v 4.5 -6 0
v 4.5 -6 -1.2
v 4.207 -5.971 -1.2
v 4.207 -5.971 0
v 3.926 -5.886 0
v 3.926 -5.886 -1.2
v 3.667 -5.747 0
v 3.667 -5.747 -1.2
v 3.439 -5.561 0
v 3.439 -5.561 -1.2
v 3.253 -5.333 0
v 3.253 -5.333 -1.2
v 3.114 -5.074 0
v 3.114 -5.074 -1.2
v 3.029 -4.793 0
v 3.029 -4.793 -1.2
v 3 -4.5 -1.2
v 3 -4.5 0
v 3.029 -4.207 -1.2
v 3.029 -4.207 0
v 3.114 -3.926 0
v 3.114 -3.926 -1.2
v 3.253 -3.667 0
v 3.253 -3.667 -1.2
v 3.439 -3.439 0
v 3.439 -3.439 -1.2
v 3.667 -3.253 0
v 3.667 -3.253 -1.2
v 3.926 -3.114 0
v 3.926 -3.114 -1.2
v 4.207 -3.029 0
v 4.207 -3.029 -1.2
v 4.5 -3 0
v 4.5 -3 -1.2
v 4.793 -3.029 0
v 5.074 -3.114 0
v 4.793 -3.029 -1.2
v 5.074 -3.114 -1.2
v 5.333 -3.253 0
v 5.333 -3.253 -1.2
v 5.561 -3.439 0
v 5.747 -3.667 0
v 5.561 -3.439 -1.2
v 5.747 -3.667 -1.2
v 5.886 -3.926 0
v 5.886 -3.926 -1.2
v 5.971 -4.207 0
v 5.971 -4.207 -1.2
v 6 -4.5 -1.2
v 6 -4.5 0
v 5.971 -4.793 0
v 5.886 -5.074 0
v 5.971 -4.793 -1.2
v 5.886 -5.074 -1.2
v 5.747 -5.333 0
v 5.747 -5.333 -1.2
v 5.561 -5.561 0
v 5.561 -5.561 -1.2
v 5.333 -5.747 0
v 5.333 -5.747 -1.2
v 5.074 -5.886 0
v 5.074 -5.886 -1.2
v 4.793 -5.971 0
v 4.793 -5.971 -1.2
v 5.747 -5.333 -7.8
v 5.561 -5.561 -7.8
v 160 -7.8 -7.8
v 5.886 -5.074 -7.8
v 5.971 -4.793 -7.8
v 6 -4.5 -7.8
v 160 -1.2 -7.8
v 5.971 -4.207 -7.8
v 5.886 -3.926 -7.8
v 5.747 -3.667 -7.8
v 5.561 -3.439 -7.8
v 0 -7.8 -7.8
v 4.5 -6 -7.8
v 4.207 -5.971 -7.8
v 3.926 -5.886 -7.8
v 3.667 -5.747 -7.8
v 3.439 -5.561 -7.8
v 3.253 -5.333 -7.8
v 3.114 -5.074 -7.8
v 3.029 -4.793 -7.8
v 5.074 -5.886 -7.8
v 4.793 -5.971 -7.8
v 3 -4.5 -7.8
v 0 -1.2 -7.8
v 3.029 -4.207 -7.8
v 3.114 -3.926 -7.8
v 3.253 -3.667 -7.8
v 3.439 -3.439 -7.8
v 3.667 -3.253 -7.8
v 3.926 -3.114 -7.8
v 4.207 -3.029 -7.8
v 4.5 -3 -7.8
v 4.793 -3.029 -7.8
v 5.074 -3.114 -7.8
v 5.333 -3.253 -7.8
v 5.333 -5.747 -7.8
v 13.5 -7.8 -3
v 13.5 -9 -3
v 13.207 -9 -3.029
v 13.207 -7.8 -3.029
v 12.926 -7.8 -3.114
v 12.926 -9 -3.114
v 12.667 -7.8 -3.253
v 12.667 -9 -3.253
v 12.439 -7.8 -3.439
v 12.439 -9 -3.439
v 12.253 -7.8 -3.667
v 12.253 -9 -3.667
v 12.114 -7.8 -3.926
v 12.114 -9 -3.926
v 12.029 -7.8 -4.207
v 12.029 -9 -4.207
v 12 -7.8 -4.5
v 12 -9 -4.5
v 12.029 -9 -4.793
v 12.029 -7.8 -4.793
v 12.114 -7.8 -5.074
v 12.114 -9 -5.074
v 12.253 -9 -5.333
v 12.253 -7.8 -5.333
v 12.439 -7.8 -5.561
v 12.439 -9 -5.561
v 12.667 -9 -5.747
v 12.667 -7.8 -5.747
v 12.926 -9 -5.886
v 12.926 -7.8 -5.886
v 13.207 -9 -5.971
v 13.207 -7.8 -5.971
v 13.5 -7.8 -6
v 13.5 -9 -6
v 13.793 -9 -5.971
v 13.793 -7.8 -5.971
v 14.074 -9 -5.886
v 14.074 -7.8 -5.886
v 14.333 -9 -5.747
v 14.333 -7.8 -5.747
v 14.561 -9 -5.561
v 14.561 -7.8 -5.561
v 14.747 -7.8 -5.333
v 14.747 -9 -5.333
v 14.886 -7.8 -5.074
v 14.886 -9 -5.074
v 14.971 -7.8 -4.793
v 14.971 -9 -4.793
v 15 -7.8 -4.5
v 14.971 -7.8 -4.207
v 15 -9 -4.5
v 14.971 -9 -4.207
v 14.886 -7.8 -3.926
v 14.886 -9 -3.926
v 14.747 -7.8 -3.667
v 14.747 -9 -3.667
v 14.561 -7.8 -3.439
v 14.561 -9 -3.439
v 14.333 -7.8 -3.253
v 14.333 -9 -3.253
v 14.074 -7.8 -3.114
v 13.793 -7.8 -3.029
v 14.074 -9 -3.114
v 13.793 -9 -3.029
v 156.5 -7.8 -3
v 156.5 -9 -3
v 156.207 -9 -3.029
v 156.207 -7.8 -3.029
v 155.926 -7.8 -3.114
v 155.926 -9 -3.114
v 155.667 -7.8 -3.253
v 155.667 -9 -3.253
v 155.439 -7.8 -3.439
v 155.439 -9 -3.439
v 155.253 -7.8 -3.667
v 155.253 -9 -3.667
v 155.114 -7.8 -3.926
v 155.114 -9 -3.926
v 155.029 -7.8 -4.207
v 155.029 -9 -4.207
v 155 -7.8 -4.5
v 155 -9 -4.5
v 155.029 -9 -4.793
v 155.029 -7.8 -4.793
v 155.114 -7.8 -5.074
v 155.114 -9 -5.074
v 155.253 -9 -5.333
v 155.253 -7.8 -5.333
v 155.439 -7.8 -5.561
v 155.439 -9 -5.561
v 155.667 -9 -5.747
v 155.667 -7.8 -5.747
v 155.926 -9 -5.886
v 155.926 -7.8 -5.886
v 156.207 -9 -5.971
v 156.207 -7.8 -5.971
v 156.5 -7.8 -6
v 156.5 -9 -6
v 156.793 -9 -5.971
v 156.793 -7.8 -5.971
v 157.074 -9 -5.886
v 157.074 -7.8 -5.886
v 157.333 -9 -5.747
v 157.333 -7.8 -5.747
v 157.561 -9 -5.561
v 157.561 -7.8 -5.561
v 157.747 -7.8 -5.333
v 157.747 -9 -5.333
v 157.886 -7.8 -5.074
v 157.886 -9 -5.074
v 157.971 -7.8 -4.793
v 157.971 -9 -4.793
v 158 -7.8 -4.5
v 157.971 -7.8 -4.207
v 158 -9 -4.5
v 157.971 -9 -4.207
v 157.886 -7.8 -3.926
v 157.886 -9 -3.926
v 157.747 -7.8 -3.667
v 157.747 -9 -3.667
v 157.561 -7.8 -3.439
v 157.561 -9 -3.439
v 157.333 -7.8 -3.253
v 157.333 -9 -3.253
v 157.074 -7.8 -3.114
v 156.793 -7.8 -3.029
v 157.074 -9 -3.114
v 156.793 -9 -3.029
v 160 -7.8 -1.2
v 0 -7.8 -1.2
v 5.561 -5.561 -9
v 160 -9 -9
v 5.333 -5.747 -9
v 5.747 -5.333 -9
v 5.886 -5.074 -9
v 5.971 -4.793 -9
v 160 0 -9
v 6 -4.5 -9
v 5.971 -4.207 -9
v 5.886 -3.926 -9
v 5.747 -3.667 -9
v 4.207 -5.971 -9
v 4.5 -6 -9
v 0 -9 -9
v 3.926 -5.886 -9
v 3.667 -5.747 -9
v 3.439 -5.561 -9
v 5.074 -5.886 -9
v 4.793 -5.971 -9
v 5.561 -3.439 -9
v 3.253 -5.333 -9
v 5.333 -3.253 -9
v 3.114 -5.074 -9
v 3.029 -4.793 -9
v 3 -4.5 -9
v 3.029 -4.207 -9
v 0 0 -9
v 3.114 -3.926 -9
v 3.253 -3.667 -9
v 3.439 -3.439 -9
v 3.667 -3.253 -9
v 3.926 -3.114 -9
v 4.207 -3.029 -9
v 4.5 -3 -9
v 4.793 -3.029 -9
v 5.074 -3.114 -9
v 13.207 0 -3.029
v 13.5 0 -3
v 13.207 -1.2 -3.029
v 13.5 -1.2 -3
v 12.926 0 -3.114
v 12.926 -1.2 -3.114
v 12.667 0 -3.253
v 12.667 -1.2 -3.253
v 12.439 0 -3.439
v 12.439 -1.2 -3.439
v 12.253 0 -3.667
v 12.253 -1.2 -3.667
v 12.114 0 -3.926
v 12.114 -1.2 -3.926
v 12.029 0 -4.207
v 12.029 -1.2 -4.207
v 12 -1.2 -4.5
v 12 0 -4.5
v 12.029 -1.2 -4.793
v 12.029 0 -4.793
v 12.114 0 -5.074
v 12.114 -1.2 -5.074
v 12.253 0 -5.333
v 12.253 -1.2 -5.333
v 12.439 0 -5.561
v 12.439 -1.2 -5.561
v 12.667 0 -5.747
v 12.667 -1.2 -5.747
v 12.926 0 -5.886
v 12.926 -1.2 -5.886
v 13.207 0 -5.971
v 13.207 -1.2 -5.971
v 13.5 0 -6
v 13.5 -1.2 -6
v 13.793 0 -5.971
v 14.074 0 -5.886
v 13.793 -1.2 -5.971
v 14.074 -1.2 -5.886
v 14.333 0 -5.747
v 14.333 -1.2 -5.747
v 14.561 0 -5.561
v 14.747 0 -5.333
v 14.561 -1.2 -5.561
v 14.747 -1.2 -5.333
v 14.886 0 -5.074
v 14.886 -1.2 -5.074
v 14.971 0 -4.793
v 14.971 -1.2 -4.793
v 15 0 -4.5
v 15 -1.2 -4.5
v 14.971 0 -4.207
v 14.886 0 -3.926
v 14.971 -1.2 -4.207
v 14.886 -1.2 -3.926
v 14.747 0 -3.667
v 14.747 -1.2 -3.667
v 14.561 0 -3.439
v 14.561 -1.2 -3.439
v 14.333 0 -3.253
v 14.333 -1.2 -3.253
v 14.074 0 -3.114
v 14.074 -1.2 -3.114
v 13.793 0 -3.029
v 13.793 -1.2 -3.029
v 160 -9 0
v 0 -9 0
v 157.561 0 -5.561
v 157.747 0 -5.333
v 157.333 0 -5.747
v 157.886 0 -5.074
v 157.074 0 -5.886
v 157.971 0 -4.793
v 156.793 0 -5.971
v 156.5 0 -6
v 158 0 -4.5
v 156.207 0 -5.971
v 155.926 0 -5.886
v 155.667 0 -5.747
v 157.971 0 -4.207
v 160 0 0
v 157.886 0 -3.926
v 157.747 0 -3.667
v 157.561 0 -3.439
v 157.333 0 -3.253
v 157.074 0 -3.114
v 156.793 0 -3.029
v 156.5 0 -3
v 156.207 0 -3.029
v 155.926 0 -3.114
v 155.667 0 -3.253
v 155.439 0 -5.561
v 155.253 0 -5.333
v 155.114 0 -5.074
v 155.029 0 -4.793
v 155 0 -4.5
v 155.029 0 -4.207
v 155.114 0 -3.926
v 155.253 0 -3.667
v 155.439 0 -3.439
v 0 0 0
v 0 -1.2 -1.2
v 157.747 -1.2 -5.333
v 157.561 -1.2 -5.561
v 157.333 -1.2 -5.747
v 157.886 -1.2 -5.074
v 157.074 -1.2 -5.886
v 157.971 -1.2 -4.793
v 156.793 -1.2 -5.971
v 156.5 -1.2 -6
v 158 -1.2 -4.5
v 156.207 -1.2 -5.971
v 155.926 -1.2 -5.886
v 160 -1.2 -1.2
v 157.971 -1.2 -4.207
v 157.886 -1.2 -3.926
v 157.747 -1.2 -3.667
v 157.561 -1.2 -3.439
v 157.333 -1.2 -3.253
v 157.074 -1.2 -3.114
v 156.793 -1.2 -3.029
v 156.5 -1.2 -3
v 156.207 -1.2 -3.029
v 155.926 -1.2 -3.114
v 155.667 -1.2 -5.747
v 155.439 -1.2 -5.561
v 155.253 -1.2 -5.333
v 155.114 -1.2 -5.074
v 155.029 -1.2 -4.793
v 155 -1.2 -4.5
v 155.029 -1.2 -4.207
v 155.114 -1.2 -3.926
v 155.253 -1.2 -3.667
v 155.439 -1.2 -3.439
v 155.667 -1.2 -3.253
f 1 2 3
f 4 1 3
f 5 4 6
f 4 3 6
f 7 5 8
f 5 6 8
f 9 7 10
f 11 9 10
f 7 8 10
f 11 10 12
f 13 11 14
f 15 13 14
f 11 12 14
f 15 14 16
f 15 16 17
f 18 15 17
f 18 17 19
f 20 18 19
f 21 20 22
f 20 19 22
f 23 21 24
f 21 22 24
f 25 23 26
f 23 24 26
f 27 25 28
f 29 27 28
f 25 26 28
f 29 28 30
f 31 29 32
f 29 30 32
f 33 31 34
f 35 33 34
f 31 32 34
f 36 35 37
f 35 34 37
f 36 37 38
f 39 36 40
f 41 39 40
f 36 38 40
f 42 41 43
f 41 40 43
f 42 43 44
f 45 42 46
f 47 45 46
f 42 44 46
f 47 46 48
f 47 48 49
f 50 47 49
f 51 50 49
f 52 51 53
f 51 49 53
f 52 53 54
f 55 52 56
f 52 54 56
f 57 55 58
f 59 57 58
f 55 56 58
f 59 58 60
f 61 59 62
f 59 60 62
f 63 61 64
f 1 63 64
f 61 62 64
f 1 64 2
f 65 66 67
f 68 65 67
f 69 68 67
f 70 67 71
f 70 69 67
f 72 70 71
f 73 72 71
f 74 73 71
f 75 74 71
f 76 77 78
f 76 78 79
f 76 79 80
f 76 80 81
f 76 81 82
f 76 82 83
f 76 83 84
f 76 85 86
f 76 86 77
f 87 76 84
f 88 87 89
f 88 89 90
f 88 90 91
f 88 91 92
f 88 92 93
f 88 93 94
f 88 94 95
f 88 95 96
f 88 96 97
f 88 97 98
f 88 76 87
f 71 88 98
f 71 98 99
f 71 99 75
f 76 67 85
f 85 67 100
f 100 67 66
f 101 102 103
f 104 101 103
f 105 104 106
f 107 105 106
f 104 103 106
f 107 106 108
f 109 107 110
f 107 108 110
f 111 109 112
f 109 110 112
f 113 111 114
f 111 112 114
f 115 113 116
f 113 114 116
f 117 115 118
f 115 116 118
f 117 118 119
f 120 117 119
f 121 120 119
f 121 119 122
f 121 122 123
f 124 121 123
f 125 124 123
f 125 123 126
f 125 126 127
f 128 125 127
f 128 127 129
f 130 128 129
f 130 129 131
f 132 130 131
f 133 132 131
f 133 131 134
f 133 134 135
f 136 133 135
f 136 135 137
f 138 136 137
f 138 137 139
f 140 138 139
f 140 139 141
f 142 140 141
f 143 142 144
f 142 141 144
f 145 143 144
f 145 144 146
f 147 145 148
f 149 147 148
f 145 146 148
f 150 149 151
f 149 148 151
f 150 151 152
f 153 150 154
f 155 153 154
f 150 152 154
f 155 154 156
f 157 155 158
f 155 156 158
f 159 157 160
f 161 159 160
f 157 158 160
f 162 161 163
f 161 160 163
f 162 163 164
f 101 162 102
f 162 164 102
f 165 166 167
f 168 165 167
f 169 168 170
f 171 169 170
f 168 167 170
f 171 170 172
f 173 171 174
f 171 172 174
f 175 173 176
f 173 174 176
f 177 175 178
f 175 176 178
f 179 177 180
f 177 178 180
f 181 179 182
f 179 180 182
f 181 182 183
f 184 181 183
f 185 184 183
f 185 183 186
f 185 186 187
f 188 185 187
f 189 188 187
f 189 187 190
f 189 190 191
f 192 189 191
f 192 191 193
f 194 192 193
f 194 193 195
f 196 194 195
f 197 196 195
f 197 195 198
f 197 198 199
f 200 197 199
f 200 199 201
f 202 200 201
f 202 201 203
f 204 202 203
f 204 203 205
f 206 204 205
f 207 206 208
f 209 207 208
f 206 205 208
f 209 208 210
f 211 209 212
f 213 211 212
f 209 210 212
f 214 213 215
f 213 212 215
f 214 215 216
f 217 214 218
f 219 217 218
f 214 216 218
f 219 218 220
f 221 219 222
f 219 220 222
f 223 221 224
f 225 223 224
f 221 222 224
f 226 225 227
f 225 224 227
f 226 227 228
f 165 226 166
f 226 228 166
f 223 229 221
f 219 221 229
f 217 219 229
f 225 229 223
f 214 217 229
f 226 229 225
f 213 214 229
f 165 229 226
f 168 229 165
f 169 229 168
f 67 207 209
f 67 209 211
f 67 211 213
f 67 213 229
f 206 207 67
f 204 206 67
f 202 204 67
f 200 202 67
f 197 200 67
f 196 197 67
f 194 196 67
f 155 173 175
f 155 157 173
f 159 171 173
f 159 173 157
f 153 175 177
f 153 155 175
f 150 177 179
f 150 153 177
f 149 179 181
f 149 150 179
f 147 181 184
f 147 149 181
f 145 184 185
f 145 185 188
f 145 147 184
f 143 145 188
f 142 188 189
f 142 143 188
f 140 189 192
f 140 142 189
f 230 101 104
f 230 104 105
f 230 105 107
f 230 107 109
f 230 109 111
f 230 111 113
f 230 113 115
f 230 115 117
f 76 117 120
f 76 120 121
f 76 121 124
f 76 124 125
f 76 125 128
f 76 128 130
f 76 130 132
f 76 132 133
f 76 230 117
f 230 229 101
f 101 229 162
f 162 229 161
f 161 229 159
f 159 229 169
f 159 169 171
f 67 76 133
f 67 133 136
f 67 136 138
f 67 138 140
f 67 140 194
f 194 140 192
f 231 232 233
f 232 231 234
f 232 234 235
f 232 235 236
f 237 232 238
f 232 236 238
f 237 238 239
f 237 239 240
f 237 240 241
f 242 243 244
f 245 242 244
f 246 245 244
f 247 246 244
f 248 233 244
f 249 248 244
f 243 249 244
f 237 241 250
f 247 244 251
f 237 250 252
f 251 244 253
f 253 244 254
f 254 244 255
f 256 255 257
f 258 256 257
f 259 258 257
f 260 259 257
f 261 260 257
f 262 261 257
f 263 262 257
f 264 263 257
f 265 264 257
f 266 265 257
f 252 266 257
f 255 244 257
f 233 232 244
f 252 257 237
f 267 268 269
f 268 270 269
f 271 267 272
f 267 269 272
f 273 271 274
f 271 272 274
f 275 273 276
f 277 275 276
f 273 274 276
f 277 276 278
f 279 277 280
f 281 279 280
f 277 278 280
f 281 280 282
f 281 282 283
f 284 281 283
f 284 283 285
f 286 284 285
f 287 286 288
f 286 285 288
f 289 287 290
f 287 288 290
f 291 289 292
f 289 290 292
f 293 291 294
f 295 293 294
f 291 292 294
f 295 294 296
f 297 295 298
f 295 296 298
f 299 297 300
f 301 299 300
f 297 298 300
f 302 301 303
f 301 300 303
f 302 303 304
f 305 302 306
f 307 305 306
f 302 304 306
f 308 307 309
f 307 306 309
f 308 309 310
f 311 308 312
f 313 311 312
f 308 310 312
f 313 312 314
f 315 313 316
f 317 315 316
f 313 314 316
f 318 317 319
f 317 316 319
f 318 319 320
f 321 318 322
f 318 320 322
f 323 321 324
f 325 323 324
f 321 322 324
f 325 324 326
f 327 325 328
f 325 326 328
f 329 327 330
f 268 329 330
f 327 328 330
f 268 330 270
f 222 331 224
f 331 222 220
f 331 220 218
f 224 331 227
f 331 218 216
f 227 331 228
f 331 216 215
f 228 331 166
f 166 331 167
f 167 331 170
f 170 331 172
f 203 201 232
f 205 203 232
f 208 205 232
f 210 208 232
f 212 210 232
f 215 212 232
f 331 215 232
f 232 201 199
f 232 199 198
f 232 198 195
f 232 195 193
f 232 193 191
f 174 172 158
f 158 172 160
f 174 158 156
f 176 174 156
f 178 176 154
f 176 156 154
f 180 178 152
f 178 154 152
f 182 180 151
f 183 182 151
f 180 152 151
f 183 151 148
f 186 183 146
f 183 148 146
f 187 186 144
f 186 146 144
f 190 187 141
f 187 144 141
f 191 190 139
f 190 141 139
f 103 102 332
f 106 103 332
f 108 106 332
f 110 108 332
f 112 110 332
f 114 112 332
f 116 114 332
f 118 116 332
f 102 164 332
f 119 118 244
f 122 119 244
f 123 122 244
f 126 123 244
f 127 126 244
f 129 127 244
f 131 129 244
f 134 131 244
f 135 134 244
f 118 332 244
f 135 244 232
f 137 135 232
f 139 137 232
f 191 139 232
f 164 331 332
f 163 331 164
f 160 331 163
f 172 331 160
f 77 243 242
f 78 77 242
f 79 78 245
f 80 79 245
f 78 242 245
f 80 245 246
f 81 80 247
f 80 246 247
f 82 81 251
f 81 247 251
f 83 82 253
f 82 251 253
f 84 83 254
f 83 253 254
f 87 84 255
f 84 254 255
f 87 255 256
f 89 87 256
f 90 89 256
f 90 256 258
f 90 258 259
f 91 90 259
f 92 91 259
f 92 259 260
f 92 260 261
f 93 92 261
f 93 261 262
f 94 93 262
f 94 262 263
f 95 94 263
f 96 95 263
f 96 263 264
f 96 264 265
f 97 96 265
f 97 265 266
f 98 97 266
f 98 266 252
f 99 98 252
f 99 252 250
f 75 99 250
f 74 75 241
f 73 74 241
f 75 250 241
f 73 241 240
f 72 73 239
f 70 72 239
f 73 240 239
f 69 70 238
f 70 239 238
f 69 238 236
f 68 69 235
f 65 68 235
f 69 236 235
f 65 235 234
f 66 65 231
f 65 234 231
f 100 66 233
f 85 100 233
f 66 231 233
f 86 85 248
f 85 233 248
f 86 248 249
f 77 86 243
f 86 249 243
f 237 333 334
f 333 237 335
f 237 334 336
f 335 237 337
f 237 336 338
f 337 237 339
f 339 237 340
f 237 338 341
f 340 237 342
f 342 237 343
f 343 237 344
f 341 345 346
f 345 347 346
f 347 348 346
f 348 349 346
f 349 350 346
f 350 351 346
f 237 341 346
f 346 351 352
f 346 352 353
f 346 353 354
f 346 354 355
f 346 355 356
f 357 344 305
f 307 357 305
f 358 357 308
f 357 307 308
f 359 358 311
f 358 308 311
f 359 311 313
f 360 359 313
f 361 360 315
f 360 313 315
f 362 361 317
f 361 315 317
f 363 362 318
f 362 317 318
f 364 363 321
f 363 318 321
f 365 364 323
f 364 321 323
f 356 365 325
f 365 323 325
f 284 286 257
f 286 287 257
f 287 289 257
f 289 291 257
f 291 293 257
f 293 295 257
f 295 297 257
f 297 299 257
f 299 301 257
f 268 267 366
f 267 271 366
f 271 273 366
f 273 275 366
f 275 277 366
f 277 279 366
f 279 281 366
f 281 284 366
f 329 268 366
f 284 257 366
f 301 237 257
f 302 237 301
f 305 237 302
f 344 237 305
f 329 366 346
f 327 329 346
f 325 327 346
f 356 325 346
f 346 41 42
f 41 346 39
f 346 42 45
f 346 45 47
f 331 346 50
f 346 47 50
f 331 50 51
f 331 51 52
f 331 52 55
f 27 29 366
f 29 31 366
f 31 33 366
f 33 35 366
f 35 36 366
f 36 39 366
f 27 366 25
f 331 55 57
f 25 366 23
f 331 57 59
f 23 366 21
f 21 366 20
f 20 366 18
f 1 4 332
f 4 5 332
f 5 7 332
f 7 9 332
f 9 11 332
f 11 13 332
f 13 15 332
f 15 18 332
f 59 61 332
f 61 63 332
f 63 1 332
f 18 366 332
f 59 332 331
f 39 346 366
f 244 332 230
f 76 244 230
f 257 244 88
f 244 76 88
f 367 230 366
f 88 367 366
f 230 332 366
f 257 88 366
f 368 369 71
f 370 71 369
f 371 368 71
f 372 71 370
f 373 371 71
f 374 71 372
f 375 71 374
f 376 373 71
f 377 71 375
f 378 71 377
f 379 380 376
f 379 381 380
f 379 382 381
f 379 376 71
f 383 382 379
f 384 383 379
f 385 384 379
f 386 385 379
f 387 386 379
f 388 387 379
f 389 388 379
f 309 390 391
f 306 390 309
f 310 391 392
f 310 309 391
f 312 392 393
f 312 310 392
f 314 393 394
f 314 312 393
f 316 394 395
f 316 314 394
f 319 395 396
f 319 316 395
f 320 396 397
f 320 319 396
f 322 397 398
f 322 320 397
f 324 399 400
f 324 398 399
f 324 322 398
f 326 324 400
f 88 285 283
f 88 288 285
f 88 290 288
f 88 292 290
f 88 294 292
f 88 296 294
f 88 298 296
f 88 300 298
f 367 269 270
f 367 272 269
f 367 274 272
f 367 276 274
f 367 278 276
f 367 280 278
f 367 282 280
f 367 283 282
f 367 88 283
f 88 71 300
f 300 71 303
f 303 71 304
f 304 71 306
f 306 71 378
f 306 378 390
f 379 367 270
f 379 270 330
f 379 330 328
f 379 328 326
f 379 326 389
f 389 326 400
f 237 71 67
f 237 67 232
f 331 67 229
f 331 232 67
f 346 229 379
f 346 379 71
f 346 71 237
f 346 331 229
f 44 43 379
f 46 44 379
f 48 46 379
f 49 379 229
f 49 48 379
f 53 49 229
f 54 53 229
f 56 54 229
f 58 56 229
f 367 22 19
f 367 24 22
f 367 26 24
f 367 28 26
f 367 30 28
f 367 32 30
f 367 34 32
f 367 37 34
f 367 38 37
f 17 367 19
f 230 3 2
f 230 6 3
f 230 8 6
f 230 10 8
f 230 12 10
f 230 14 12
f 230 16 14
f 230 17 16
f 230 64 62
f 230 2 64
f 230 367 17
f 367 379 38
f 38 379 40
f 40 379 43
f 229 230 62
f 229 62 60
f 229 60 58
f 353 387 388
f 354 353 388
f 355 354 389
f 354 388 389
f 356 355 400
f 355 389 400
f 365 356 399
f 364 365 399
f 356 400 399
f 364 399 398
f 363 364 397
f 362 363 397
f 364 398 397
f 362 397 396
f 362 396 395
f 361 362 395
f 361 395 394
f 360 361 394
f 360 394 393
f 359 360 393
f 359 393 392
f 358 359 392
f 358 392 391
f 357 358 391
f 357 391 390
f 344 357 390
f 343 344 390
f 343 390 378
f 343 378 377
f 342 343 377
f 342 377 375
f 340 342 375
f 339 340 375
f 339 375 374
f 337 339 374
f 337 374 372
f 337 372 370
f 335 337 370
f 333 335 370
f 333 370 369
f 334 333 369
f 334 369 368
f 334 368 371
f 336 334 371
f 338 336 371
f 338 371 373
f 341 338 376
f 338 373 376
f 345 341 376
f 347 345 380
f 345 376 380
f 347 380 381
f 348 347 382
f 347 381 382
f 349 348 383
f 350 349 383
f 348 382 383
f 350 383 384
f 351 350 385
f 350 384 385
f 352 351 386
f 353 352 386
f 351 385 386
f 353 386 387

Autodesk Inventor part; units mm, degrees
ref_plane "YZ Plane" through (0, 0, 0) normal (1, 0, 0) x (0, 1, 0)
ref_plane "XZ Plane" through (0, 0, 0) normal (0, 1, 0) x (-1, 0, 0)
ref_plane "XY Plane" through (0, 0, 0) normal (0, 0, 1) x (1, 0, 0)
sketch "スケッチ1" plane through (0, 0, 0) normal (1, 0, 0) x (0, 1, 0)
  line L0 (0, 0) -> (-9, 0)
  line L1 (-9, 0) -> (-9, -9)
  line L2 (-9, -9) -> (0, -9)
  line L3 (0, -9) -> (0, 0)
  line L4 (-1.2, -1.2) -> (-7.8, -1.2)
  line L5 (-7.8, -1.2) -> (-7.8, -7.8)
  line L6 (-7.8, -7.8) -> (-1.2, -7.8)
  line L7 (-1.2, -7.8) -> (-1.2, -1.2)
  dimension "d0" = 9
  dimension "d1" = 9
  dimension "d2" = 6.6
  dimension "d3" = 6.6
  dimension "d4" = 1.2
  dimension "d5" = 1.2
extrude "押し出し1" add sketch "スケッチ1" along normal blind 160
sketch "スケッチ2" plane through (0, 0, 0) normal (0, 1, 0) x (1, 0, 0)
  line L0 (0, 9) -> (160, 9) projected
  line L1 (0, 9) -> (0, 0) projected
  line L2 (160, 9) -> (160, 0) projected
  point P0 (13.5, 4.5)
  point P1 (156.5, 4.5)
  dimension "d8" = 4.5
  dimension "d9" = 4.5
  dimension "d10" = 13.5
  dimension "d11" = 3.5
hole "穴1" at (13.5, 0, -4.5) at (156.5, 0, -4.5) direction (0, -1, 0) diameter 3 end through all
sketch "スケッチ3" plane through (0, -9, 0) normal (0, 0, 1) x (1, 0, 0)
  line L0 (0, 9) -> (160, 9) projected
  line L1 (0, 9) -> (0, 0) projected
  point P0 (4.5, 4.5)
  dimension "d19" = 4.5
  dimension "d20" = 4.5
hole "穴2" at (4.5, -4.5, 0) direction (0, 0, -1) diameter 3 end through all
equation "\"d3\" = d2"
equation "\"d5\" = d4"
equation "\"d20\" = d19"
properties part number "ハンド9x9_6" material "アルミニウム 6061"
